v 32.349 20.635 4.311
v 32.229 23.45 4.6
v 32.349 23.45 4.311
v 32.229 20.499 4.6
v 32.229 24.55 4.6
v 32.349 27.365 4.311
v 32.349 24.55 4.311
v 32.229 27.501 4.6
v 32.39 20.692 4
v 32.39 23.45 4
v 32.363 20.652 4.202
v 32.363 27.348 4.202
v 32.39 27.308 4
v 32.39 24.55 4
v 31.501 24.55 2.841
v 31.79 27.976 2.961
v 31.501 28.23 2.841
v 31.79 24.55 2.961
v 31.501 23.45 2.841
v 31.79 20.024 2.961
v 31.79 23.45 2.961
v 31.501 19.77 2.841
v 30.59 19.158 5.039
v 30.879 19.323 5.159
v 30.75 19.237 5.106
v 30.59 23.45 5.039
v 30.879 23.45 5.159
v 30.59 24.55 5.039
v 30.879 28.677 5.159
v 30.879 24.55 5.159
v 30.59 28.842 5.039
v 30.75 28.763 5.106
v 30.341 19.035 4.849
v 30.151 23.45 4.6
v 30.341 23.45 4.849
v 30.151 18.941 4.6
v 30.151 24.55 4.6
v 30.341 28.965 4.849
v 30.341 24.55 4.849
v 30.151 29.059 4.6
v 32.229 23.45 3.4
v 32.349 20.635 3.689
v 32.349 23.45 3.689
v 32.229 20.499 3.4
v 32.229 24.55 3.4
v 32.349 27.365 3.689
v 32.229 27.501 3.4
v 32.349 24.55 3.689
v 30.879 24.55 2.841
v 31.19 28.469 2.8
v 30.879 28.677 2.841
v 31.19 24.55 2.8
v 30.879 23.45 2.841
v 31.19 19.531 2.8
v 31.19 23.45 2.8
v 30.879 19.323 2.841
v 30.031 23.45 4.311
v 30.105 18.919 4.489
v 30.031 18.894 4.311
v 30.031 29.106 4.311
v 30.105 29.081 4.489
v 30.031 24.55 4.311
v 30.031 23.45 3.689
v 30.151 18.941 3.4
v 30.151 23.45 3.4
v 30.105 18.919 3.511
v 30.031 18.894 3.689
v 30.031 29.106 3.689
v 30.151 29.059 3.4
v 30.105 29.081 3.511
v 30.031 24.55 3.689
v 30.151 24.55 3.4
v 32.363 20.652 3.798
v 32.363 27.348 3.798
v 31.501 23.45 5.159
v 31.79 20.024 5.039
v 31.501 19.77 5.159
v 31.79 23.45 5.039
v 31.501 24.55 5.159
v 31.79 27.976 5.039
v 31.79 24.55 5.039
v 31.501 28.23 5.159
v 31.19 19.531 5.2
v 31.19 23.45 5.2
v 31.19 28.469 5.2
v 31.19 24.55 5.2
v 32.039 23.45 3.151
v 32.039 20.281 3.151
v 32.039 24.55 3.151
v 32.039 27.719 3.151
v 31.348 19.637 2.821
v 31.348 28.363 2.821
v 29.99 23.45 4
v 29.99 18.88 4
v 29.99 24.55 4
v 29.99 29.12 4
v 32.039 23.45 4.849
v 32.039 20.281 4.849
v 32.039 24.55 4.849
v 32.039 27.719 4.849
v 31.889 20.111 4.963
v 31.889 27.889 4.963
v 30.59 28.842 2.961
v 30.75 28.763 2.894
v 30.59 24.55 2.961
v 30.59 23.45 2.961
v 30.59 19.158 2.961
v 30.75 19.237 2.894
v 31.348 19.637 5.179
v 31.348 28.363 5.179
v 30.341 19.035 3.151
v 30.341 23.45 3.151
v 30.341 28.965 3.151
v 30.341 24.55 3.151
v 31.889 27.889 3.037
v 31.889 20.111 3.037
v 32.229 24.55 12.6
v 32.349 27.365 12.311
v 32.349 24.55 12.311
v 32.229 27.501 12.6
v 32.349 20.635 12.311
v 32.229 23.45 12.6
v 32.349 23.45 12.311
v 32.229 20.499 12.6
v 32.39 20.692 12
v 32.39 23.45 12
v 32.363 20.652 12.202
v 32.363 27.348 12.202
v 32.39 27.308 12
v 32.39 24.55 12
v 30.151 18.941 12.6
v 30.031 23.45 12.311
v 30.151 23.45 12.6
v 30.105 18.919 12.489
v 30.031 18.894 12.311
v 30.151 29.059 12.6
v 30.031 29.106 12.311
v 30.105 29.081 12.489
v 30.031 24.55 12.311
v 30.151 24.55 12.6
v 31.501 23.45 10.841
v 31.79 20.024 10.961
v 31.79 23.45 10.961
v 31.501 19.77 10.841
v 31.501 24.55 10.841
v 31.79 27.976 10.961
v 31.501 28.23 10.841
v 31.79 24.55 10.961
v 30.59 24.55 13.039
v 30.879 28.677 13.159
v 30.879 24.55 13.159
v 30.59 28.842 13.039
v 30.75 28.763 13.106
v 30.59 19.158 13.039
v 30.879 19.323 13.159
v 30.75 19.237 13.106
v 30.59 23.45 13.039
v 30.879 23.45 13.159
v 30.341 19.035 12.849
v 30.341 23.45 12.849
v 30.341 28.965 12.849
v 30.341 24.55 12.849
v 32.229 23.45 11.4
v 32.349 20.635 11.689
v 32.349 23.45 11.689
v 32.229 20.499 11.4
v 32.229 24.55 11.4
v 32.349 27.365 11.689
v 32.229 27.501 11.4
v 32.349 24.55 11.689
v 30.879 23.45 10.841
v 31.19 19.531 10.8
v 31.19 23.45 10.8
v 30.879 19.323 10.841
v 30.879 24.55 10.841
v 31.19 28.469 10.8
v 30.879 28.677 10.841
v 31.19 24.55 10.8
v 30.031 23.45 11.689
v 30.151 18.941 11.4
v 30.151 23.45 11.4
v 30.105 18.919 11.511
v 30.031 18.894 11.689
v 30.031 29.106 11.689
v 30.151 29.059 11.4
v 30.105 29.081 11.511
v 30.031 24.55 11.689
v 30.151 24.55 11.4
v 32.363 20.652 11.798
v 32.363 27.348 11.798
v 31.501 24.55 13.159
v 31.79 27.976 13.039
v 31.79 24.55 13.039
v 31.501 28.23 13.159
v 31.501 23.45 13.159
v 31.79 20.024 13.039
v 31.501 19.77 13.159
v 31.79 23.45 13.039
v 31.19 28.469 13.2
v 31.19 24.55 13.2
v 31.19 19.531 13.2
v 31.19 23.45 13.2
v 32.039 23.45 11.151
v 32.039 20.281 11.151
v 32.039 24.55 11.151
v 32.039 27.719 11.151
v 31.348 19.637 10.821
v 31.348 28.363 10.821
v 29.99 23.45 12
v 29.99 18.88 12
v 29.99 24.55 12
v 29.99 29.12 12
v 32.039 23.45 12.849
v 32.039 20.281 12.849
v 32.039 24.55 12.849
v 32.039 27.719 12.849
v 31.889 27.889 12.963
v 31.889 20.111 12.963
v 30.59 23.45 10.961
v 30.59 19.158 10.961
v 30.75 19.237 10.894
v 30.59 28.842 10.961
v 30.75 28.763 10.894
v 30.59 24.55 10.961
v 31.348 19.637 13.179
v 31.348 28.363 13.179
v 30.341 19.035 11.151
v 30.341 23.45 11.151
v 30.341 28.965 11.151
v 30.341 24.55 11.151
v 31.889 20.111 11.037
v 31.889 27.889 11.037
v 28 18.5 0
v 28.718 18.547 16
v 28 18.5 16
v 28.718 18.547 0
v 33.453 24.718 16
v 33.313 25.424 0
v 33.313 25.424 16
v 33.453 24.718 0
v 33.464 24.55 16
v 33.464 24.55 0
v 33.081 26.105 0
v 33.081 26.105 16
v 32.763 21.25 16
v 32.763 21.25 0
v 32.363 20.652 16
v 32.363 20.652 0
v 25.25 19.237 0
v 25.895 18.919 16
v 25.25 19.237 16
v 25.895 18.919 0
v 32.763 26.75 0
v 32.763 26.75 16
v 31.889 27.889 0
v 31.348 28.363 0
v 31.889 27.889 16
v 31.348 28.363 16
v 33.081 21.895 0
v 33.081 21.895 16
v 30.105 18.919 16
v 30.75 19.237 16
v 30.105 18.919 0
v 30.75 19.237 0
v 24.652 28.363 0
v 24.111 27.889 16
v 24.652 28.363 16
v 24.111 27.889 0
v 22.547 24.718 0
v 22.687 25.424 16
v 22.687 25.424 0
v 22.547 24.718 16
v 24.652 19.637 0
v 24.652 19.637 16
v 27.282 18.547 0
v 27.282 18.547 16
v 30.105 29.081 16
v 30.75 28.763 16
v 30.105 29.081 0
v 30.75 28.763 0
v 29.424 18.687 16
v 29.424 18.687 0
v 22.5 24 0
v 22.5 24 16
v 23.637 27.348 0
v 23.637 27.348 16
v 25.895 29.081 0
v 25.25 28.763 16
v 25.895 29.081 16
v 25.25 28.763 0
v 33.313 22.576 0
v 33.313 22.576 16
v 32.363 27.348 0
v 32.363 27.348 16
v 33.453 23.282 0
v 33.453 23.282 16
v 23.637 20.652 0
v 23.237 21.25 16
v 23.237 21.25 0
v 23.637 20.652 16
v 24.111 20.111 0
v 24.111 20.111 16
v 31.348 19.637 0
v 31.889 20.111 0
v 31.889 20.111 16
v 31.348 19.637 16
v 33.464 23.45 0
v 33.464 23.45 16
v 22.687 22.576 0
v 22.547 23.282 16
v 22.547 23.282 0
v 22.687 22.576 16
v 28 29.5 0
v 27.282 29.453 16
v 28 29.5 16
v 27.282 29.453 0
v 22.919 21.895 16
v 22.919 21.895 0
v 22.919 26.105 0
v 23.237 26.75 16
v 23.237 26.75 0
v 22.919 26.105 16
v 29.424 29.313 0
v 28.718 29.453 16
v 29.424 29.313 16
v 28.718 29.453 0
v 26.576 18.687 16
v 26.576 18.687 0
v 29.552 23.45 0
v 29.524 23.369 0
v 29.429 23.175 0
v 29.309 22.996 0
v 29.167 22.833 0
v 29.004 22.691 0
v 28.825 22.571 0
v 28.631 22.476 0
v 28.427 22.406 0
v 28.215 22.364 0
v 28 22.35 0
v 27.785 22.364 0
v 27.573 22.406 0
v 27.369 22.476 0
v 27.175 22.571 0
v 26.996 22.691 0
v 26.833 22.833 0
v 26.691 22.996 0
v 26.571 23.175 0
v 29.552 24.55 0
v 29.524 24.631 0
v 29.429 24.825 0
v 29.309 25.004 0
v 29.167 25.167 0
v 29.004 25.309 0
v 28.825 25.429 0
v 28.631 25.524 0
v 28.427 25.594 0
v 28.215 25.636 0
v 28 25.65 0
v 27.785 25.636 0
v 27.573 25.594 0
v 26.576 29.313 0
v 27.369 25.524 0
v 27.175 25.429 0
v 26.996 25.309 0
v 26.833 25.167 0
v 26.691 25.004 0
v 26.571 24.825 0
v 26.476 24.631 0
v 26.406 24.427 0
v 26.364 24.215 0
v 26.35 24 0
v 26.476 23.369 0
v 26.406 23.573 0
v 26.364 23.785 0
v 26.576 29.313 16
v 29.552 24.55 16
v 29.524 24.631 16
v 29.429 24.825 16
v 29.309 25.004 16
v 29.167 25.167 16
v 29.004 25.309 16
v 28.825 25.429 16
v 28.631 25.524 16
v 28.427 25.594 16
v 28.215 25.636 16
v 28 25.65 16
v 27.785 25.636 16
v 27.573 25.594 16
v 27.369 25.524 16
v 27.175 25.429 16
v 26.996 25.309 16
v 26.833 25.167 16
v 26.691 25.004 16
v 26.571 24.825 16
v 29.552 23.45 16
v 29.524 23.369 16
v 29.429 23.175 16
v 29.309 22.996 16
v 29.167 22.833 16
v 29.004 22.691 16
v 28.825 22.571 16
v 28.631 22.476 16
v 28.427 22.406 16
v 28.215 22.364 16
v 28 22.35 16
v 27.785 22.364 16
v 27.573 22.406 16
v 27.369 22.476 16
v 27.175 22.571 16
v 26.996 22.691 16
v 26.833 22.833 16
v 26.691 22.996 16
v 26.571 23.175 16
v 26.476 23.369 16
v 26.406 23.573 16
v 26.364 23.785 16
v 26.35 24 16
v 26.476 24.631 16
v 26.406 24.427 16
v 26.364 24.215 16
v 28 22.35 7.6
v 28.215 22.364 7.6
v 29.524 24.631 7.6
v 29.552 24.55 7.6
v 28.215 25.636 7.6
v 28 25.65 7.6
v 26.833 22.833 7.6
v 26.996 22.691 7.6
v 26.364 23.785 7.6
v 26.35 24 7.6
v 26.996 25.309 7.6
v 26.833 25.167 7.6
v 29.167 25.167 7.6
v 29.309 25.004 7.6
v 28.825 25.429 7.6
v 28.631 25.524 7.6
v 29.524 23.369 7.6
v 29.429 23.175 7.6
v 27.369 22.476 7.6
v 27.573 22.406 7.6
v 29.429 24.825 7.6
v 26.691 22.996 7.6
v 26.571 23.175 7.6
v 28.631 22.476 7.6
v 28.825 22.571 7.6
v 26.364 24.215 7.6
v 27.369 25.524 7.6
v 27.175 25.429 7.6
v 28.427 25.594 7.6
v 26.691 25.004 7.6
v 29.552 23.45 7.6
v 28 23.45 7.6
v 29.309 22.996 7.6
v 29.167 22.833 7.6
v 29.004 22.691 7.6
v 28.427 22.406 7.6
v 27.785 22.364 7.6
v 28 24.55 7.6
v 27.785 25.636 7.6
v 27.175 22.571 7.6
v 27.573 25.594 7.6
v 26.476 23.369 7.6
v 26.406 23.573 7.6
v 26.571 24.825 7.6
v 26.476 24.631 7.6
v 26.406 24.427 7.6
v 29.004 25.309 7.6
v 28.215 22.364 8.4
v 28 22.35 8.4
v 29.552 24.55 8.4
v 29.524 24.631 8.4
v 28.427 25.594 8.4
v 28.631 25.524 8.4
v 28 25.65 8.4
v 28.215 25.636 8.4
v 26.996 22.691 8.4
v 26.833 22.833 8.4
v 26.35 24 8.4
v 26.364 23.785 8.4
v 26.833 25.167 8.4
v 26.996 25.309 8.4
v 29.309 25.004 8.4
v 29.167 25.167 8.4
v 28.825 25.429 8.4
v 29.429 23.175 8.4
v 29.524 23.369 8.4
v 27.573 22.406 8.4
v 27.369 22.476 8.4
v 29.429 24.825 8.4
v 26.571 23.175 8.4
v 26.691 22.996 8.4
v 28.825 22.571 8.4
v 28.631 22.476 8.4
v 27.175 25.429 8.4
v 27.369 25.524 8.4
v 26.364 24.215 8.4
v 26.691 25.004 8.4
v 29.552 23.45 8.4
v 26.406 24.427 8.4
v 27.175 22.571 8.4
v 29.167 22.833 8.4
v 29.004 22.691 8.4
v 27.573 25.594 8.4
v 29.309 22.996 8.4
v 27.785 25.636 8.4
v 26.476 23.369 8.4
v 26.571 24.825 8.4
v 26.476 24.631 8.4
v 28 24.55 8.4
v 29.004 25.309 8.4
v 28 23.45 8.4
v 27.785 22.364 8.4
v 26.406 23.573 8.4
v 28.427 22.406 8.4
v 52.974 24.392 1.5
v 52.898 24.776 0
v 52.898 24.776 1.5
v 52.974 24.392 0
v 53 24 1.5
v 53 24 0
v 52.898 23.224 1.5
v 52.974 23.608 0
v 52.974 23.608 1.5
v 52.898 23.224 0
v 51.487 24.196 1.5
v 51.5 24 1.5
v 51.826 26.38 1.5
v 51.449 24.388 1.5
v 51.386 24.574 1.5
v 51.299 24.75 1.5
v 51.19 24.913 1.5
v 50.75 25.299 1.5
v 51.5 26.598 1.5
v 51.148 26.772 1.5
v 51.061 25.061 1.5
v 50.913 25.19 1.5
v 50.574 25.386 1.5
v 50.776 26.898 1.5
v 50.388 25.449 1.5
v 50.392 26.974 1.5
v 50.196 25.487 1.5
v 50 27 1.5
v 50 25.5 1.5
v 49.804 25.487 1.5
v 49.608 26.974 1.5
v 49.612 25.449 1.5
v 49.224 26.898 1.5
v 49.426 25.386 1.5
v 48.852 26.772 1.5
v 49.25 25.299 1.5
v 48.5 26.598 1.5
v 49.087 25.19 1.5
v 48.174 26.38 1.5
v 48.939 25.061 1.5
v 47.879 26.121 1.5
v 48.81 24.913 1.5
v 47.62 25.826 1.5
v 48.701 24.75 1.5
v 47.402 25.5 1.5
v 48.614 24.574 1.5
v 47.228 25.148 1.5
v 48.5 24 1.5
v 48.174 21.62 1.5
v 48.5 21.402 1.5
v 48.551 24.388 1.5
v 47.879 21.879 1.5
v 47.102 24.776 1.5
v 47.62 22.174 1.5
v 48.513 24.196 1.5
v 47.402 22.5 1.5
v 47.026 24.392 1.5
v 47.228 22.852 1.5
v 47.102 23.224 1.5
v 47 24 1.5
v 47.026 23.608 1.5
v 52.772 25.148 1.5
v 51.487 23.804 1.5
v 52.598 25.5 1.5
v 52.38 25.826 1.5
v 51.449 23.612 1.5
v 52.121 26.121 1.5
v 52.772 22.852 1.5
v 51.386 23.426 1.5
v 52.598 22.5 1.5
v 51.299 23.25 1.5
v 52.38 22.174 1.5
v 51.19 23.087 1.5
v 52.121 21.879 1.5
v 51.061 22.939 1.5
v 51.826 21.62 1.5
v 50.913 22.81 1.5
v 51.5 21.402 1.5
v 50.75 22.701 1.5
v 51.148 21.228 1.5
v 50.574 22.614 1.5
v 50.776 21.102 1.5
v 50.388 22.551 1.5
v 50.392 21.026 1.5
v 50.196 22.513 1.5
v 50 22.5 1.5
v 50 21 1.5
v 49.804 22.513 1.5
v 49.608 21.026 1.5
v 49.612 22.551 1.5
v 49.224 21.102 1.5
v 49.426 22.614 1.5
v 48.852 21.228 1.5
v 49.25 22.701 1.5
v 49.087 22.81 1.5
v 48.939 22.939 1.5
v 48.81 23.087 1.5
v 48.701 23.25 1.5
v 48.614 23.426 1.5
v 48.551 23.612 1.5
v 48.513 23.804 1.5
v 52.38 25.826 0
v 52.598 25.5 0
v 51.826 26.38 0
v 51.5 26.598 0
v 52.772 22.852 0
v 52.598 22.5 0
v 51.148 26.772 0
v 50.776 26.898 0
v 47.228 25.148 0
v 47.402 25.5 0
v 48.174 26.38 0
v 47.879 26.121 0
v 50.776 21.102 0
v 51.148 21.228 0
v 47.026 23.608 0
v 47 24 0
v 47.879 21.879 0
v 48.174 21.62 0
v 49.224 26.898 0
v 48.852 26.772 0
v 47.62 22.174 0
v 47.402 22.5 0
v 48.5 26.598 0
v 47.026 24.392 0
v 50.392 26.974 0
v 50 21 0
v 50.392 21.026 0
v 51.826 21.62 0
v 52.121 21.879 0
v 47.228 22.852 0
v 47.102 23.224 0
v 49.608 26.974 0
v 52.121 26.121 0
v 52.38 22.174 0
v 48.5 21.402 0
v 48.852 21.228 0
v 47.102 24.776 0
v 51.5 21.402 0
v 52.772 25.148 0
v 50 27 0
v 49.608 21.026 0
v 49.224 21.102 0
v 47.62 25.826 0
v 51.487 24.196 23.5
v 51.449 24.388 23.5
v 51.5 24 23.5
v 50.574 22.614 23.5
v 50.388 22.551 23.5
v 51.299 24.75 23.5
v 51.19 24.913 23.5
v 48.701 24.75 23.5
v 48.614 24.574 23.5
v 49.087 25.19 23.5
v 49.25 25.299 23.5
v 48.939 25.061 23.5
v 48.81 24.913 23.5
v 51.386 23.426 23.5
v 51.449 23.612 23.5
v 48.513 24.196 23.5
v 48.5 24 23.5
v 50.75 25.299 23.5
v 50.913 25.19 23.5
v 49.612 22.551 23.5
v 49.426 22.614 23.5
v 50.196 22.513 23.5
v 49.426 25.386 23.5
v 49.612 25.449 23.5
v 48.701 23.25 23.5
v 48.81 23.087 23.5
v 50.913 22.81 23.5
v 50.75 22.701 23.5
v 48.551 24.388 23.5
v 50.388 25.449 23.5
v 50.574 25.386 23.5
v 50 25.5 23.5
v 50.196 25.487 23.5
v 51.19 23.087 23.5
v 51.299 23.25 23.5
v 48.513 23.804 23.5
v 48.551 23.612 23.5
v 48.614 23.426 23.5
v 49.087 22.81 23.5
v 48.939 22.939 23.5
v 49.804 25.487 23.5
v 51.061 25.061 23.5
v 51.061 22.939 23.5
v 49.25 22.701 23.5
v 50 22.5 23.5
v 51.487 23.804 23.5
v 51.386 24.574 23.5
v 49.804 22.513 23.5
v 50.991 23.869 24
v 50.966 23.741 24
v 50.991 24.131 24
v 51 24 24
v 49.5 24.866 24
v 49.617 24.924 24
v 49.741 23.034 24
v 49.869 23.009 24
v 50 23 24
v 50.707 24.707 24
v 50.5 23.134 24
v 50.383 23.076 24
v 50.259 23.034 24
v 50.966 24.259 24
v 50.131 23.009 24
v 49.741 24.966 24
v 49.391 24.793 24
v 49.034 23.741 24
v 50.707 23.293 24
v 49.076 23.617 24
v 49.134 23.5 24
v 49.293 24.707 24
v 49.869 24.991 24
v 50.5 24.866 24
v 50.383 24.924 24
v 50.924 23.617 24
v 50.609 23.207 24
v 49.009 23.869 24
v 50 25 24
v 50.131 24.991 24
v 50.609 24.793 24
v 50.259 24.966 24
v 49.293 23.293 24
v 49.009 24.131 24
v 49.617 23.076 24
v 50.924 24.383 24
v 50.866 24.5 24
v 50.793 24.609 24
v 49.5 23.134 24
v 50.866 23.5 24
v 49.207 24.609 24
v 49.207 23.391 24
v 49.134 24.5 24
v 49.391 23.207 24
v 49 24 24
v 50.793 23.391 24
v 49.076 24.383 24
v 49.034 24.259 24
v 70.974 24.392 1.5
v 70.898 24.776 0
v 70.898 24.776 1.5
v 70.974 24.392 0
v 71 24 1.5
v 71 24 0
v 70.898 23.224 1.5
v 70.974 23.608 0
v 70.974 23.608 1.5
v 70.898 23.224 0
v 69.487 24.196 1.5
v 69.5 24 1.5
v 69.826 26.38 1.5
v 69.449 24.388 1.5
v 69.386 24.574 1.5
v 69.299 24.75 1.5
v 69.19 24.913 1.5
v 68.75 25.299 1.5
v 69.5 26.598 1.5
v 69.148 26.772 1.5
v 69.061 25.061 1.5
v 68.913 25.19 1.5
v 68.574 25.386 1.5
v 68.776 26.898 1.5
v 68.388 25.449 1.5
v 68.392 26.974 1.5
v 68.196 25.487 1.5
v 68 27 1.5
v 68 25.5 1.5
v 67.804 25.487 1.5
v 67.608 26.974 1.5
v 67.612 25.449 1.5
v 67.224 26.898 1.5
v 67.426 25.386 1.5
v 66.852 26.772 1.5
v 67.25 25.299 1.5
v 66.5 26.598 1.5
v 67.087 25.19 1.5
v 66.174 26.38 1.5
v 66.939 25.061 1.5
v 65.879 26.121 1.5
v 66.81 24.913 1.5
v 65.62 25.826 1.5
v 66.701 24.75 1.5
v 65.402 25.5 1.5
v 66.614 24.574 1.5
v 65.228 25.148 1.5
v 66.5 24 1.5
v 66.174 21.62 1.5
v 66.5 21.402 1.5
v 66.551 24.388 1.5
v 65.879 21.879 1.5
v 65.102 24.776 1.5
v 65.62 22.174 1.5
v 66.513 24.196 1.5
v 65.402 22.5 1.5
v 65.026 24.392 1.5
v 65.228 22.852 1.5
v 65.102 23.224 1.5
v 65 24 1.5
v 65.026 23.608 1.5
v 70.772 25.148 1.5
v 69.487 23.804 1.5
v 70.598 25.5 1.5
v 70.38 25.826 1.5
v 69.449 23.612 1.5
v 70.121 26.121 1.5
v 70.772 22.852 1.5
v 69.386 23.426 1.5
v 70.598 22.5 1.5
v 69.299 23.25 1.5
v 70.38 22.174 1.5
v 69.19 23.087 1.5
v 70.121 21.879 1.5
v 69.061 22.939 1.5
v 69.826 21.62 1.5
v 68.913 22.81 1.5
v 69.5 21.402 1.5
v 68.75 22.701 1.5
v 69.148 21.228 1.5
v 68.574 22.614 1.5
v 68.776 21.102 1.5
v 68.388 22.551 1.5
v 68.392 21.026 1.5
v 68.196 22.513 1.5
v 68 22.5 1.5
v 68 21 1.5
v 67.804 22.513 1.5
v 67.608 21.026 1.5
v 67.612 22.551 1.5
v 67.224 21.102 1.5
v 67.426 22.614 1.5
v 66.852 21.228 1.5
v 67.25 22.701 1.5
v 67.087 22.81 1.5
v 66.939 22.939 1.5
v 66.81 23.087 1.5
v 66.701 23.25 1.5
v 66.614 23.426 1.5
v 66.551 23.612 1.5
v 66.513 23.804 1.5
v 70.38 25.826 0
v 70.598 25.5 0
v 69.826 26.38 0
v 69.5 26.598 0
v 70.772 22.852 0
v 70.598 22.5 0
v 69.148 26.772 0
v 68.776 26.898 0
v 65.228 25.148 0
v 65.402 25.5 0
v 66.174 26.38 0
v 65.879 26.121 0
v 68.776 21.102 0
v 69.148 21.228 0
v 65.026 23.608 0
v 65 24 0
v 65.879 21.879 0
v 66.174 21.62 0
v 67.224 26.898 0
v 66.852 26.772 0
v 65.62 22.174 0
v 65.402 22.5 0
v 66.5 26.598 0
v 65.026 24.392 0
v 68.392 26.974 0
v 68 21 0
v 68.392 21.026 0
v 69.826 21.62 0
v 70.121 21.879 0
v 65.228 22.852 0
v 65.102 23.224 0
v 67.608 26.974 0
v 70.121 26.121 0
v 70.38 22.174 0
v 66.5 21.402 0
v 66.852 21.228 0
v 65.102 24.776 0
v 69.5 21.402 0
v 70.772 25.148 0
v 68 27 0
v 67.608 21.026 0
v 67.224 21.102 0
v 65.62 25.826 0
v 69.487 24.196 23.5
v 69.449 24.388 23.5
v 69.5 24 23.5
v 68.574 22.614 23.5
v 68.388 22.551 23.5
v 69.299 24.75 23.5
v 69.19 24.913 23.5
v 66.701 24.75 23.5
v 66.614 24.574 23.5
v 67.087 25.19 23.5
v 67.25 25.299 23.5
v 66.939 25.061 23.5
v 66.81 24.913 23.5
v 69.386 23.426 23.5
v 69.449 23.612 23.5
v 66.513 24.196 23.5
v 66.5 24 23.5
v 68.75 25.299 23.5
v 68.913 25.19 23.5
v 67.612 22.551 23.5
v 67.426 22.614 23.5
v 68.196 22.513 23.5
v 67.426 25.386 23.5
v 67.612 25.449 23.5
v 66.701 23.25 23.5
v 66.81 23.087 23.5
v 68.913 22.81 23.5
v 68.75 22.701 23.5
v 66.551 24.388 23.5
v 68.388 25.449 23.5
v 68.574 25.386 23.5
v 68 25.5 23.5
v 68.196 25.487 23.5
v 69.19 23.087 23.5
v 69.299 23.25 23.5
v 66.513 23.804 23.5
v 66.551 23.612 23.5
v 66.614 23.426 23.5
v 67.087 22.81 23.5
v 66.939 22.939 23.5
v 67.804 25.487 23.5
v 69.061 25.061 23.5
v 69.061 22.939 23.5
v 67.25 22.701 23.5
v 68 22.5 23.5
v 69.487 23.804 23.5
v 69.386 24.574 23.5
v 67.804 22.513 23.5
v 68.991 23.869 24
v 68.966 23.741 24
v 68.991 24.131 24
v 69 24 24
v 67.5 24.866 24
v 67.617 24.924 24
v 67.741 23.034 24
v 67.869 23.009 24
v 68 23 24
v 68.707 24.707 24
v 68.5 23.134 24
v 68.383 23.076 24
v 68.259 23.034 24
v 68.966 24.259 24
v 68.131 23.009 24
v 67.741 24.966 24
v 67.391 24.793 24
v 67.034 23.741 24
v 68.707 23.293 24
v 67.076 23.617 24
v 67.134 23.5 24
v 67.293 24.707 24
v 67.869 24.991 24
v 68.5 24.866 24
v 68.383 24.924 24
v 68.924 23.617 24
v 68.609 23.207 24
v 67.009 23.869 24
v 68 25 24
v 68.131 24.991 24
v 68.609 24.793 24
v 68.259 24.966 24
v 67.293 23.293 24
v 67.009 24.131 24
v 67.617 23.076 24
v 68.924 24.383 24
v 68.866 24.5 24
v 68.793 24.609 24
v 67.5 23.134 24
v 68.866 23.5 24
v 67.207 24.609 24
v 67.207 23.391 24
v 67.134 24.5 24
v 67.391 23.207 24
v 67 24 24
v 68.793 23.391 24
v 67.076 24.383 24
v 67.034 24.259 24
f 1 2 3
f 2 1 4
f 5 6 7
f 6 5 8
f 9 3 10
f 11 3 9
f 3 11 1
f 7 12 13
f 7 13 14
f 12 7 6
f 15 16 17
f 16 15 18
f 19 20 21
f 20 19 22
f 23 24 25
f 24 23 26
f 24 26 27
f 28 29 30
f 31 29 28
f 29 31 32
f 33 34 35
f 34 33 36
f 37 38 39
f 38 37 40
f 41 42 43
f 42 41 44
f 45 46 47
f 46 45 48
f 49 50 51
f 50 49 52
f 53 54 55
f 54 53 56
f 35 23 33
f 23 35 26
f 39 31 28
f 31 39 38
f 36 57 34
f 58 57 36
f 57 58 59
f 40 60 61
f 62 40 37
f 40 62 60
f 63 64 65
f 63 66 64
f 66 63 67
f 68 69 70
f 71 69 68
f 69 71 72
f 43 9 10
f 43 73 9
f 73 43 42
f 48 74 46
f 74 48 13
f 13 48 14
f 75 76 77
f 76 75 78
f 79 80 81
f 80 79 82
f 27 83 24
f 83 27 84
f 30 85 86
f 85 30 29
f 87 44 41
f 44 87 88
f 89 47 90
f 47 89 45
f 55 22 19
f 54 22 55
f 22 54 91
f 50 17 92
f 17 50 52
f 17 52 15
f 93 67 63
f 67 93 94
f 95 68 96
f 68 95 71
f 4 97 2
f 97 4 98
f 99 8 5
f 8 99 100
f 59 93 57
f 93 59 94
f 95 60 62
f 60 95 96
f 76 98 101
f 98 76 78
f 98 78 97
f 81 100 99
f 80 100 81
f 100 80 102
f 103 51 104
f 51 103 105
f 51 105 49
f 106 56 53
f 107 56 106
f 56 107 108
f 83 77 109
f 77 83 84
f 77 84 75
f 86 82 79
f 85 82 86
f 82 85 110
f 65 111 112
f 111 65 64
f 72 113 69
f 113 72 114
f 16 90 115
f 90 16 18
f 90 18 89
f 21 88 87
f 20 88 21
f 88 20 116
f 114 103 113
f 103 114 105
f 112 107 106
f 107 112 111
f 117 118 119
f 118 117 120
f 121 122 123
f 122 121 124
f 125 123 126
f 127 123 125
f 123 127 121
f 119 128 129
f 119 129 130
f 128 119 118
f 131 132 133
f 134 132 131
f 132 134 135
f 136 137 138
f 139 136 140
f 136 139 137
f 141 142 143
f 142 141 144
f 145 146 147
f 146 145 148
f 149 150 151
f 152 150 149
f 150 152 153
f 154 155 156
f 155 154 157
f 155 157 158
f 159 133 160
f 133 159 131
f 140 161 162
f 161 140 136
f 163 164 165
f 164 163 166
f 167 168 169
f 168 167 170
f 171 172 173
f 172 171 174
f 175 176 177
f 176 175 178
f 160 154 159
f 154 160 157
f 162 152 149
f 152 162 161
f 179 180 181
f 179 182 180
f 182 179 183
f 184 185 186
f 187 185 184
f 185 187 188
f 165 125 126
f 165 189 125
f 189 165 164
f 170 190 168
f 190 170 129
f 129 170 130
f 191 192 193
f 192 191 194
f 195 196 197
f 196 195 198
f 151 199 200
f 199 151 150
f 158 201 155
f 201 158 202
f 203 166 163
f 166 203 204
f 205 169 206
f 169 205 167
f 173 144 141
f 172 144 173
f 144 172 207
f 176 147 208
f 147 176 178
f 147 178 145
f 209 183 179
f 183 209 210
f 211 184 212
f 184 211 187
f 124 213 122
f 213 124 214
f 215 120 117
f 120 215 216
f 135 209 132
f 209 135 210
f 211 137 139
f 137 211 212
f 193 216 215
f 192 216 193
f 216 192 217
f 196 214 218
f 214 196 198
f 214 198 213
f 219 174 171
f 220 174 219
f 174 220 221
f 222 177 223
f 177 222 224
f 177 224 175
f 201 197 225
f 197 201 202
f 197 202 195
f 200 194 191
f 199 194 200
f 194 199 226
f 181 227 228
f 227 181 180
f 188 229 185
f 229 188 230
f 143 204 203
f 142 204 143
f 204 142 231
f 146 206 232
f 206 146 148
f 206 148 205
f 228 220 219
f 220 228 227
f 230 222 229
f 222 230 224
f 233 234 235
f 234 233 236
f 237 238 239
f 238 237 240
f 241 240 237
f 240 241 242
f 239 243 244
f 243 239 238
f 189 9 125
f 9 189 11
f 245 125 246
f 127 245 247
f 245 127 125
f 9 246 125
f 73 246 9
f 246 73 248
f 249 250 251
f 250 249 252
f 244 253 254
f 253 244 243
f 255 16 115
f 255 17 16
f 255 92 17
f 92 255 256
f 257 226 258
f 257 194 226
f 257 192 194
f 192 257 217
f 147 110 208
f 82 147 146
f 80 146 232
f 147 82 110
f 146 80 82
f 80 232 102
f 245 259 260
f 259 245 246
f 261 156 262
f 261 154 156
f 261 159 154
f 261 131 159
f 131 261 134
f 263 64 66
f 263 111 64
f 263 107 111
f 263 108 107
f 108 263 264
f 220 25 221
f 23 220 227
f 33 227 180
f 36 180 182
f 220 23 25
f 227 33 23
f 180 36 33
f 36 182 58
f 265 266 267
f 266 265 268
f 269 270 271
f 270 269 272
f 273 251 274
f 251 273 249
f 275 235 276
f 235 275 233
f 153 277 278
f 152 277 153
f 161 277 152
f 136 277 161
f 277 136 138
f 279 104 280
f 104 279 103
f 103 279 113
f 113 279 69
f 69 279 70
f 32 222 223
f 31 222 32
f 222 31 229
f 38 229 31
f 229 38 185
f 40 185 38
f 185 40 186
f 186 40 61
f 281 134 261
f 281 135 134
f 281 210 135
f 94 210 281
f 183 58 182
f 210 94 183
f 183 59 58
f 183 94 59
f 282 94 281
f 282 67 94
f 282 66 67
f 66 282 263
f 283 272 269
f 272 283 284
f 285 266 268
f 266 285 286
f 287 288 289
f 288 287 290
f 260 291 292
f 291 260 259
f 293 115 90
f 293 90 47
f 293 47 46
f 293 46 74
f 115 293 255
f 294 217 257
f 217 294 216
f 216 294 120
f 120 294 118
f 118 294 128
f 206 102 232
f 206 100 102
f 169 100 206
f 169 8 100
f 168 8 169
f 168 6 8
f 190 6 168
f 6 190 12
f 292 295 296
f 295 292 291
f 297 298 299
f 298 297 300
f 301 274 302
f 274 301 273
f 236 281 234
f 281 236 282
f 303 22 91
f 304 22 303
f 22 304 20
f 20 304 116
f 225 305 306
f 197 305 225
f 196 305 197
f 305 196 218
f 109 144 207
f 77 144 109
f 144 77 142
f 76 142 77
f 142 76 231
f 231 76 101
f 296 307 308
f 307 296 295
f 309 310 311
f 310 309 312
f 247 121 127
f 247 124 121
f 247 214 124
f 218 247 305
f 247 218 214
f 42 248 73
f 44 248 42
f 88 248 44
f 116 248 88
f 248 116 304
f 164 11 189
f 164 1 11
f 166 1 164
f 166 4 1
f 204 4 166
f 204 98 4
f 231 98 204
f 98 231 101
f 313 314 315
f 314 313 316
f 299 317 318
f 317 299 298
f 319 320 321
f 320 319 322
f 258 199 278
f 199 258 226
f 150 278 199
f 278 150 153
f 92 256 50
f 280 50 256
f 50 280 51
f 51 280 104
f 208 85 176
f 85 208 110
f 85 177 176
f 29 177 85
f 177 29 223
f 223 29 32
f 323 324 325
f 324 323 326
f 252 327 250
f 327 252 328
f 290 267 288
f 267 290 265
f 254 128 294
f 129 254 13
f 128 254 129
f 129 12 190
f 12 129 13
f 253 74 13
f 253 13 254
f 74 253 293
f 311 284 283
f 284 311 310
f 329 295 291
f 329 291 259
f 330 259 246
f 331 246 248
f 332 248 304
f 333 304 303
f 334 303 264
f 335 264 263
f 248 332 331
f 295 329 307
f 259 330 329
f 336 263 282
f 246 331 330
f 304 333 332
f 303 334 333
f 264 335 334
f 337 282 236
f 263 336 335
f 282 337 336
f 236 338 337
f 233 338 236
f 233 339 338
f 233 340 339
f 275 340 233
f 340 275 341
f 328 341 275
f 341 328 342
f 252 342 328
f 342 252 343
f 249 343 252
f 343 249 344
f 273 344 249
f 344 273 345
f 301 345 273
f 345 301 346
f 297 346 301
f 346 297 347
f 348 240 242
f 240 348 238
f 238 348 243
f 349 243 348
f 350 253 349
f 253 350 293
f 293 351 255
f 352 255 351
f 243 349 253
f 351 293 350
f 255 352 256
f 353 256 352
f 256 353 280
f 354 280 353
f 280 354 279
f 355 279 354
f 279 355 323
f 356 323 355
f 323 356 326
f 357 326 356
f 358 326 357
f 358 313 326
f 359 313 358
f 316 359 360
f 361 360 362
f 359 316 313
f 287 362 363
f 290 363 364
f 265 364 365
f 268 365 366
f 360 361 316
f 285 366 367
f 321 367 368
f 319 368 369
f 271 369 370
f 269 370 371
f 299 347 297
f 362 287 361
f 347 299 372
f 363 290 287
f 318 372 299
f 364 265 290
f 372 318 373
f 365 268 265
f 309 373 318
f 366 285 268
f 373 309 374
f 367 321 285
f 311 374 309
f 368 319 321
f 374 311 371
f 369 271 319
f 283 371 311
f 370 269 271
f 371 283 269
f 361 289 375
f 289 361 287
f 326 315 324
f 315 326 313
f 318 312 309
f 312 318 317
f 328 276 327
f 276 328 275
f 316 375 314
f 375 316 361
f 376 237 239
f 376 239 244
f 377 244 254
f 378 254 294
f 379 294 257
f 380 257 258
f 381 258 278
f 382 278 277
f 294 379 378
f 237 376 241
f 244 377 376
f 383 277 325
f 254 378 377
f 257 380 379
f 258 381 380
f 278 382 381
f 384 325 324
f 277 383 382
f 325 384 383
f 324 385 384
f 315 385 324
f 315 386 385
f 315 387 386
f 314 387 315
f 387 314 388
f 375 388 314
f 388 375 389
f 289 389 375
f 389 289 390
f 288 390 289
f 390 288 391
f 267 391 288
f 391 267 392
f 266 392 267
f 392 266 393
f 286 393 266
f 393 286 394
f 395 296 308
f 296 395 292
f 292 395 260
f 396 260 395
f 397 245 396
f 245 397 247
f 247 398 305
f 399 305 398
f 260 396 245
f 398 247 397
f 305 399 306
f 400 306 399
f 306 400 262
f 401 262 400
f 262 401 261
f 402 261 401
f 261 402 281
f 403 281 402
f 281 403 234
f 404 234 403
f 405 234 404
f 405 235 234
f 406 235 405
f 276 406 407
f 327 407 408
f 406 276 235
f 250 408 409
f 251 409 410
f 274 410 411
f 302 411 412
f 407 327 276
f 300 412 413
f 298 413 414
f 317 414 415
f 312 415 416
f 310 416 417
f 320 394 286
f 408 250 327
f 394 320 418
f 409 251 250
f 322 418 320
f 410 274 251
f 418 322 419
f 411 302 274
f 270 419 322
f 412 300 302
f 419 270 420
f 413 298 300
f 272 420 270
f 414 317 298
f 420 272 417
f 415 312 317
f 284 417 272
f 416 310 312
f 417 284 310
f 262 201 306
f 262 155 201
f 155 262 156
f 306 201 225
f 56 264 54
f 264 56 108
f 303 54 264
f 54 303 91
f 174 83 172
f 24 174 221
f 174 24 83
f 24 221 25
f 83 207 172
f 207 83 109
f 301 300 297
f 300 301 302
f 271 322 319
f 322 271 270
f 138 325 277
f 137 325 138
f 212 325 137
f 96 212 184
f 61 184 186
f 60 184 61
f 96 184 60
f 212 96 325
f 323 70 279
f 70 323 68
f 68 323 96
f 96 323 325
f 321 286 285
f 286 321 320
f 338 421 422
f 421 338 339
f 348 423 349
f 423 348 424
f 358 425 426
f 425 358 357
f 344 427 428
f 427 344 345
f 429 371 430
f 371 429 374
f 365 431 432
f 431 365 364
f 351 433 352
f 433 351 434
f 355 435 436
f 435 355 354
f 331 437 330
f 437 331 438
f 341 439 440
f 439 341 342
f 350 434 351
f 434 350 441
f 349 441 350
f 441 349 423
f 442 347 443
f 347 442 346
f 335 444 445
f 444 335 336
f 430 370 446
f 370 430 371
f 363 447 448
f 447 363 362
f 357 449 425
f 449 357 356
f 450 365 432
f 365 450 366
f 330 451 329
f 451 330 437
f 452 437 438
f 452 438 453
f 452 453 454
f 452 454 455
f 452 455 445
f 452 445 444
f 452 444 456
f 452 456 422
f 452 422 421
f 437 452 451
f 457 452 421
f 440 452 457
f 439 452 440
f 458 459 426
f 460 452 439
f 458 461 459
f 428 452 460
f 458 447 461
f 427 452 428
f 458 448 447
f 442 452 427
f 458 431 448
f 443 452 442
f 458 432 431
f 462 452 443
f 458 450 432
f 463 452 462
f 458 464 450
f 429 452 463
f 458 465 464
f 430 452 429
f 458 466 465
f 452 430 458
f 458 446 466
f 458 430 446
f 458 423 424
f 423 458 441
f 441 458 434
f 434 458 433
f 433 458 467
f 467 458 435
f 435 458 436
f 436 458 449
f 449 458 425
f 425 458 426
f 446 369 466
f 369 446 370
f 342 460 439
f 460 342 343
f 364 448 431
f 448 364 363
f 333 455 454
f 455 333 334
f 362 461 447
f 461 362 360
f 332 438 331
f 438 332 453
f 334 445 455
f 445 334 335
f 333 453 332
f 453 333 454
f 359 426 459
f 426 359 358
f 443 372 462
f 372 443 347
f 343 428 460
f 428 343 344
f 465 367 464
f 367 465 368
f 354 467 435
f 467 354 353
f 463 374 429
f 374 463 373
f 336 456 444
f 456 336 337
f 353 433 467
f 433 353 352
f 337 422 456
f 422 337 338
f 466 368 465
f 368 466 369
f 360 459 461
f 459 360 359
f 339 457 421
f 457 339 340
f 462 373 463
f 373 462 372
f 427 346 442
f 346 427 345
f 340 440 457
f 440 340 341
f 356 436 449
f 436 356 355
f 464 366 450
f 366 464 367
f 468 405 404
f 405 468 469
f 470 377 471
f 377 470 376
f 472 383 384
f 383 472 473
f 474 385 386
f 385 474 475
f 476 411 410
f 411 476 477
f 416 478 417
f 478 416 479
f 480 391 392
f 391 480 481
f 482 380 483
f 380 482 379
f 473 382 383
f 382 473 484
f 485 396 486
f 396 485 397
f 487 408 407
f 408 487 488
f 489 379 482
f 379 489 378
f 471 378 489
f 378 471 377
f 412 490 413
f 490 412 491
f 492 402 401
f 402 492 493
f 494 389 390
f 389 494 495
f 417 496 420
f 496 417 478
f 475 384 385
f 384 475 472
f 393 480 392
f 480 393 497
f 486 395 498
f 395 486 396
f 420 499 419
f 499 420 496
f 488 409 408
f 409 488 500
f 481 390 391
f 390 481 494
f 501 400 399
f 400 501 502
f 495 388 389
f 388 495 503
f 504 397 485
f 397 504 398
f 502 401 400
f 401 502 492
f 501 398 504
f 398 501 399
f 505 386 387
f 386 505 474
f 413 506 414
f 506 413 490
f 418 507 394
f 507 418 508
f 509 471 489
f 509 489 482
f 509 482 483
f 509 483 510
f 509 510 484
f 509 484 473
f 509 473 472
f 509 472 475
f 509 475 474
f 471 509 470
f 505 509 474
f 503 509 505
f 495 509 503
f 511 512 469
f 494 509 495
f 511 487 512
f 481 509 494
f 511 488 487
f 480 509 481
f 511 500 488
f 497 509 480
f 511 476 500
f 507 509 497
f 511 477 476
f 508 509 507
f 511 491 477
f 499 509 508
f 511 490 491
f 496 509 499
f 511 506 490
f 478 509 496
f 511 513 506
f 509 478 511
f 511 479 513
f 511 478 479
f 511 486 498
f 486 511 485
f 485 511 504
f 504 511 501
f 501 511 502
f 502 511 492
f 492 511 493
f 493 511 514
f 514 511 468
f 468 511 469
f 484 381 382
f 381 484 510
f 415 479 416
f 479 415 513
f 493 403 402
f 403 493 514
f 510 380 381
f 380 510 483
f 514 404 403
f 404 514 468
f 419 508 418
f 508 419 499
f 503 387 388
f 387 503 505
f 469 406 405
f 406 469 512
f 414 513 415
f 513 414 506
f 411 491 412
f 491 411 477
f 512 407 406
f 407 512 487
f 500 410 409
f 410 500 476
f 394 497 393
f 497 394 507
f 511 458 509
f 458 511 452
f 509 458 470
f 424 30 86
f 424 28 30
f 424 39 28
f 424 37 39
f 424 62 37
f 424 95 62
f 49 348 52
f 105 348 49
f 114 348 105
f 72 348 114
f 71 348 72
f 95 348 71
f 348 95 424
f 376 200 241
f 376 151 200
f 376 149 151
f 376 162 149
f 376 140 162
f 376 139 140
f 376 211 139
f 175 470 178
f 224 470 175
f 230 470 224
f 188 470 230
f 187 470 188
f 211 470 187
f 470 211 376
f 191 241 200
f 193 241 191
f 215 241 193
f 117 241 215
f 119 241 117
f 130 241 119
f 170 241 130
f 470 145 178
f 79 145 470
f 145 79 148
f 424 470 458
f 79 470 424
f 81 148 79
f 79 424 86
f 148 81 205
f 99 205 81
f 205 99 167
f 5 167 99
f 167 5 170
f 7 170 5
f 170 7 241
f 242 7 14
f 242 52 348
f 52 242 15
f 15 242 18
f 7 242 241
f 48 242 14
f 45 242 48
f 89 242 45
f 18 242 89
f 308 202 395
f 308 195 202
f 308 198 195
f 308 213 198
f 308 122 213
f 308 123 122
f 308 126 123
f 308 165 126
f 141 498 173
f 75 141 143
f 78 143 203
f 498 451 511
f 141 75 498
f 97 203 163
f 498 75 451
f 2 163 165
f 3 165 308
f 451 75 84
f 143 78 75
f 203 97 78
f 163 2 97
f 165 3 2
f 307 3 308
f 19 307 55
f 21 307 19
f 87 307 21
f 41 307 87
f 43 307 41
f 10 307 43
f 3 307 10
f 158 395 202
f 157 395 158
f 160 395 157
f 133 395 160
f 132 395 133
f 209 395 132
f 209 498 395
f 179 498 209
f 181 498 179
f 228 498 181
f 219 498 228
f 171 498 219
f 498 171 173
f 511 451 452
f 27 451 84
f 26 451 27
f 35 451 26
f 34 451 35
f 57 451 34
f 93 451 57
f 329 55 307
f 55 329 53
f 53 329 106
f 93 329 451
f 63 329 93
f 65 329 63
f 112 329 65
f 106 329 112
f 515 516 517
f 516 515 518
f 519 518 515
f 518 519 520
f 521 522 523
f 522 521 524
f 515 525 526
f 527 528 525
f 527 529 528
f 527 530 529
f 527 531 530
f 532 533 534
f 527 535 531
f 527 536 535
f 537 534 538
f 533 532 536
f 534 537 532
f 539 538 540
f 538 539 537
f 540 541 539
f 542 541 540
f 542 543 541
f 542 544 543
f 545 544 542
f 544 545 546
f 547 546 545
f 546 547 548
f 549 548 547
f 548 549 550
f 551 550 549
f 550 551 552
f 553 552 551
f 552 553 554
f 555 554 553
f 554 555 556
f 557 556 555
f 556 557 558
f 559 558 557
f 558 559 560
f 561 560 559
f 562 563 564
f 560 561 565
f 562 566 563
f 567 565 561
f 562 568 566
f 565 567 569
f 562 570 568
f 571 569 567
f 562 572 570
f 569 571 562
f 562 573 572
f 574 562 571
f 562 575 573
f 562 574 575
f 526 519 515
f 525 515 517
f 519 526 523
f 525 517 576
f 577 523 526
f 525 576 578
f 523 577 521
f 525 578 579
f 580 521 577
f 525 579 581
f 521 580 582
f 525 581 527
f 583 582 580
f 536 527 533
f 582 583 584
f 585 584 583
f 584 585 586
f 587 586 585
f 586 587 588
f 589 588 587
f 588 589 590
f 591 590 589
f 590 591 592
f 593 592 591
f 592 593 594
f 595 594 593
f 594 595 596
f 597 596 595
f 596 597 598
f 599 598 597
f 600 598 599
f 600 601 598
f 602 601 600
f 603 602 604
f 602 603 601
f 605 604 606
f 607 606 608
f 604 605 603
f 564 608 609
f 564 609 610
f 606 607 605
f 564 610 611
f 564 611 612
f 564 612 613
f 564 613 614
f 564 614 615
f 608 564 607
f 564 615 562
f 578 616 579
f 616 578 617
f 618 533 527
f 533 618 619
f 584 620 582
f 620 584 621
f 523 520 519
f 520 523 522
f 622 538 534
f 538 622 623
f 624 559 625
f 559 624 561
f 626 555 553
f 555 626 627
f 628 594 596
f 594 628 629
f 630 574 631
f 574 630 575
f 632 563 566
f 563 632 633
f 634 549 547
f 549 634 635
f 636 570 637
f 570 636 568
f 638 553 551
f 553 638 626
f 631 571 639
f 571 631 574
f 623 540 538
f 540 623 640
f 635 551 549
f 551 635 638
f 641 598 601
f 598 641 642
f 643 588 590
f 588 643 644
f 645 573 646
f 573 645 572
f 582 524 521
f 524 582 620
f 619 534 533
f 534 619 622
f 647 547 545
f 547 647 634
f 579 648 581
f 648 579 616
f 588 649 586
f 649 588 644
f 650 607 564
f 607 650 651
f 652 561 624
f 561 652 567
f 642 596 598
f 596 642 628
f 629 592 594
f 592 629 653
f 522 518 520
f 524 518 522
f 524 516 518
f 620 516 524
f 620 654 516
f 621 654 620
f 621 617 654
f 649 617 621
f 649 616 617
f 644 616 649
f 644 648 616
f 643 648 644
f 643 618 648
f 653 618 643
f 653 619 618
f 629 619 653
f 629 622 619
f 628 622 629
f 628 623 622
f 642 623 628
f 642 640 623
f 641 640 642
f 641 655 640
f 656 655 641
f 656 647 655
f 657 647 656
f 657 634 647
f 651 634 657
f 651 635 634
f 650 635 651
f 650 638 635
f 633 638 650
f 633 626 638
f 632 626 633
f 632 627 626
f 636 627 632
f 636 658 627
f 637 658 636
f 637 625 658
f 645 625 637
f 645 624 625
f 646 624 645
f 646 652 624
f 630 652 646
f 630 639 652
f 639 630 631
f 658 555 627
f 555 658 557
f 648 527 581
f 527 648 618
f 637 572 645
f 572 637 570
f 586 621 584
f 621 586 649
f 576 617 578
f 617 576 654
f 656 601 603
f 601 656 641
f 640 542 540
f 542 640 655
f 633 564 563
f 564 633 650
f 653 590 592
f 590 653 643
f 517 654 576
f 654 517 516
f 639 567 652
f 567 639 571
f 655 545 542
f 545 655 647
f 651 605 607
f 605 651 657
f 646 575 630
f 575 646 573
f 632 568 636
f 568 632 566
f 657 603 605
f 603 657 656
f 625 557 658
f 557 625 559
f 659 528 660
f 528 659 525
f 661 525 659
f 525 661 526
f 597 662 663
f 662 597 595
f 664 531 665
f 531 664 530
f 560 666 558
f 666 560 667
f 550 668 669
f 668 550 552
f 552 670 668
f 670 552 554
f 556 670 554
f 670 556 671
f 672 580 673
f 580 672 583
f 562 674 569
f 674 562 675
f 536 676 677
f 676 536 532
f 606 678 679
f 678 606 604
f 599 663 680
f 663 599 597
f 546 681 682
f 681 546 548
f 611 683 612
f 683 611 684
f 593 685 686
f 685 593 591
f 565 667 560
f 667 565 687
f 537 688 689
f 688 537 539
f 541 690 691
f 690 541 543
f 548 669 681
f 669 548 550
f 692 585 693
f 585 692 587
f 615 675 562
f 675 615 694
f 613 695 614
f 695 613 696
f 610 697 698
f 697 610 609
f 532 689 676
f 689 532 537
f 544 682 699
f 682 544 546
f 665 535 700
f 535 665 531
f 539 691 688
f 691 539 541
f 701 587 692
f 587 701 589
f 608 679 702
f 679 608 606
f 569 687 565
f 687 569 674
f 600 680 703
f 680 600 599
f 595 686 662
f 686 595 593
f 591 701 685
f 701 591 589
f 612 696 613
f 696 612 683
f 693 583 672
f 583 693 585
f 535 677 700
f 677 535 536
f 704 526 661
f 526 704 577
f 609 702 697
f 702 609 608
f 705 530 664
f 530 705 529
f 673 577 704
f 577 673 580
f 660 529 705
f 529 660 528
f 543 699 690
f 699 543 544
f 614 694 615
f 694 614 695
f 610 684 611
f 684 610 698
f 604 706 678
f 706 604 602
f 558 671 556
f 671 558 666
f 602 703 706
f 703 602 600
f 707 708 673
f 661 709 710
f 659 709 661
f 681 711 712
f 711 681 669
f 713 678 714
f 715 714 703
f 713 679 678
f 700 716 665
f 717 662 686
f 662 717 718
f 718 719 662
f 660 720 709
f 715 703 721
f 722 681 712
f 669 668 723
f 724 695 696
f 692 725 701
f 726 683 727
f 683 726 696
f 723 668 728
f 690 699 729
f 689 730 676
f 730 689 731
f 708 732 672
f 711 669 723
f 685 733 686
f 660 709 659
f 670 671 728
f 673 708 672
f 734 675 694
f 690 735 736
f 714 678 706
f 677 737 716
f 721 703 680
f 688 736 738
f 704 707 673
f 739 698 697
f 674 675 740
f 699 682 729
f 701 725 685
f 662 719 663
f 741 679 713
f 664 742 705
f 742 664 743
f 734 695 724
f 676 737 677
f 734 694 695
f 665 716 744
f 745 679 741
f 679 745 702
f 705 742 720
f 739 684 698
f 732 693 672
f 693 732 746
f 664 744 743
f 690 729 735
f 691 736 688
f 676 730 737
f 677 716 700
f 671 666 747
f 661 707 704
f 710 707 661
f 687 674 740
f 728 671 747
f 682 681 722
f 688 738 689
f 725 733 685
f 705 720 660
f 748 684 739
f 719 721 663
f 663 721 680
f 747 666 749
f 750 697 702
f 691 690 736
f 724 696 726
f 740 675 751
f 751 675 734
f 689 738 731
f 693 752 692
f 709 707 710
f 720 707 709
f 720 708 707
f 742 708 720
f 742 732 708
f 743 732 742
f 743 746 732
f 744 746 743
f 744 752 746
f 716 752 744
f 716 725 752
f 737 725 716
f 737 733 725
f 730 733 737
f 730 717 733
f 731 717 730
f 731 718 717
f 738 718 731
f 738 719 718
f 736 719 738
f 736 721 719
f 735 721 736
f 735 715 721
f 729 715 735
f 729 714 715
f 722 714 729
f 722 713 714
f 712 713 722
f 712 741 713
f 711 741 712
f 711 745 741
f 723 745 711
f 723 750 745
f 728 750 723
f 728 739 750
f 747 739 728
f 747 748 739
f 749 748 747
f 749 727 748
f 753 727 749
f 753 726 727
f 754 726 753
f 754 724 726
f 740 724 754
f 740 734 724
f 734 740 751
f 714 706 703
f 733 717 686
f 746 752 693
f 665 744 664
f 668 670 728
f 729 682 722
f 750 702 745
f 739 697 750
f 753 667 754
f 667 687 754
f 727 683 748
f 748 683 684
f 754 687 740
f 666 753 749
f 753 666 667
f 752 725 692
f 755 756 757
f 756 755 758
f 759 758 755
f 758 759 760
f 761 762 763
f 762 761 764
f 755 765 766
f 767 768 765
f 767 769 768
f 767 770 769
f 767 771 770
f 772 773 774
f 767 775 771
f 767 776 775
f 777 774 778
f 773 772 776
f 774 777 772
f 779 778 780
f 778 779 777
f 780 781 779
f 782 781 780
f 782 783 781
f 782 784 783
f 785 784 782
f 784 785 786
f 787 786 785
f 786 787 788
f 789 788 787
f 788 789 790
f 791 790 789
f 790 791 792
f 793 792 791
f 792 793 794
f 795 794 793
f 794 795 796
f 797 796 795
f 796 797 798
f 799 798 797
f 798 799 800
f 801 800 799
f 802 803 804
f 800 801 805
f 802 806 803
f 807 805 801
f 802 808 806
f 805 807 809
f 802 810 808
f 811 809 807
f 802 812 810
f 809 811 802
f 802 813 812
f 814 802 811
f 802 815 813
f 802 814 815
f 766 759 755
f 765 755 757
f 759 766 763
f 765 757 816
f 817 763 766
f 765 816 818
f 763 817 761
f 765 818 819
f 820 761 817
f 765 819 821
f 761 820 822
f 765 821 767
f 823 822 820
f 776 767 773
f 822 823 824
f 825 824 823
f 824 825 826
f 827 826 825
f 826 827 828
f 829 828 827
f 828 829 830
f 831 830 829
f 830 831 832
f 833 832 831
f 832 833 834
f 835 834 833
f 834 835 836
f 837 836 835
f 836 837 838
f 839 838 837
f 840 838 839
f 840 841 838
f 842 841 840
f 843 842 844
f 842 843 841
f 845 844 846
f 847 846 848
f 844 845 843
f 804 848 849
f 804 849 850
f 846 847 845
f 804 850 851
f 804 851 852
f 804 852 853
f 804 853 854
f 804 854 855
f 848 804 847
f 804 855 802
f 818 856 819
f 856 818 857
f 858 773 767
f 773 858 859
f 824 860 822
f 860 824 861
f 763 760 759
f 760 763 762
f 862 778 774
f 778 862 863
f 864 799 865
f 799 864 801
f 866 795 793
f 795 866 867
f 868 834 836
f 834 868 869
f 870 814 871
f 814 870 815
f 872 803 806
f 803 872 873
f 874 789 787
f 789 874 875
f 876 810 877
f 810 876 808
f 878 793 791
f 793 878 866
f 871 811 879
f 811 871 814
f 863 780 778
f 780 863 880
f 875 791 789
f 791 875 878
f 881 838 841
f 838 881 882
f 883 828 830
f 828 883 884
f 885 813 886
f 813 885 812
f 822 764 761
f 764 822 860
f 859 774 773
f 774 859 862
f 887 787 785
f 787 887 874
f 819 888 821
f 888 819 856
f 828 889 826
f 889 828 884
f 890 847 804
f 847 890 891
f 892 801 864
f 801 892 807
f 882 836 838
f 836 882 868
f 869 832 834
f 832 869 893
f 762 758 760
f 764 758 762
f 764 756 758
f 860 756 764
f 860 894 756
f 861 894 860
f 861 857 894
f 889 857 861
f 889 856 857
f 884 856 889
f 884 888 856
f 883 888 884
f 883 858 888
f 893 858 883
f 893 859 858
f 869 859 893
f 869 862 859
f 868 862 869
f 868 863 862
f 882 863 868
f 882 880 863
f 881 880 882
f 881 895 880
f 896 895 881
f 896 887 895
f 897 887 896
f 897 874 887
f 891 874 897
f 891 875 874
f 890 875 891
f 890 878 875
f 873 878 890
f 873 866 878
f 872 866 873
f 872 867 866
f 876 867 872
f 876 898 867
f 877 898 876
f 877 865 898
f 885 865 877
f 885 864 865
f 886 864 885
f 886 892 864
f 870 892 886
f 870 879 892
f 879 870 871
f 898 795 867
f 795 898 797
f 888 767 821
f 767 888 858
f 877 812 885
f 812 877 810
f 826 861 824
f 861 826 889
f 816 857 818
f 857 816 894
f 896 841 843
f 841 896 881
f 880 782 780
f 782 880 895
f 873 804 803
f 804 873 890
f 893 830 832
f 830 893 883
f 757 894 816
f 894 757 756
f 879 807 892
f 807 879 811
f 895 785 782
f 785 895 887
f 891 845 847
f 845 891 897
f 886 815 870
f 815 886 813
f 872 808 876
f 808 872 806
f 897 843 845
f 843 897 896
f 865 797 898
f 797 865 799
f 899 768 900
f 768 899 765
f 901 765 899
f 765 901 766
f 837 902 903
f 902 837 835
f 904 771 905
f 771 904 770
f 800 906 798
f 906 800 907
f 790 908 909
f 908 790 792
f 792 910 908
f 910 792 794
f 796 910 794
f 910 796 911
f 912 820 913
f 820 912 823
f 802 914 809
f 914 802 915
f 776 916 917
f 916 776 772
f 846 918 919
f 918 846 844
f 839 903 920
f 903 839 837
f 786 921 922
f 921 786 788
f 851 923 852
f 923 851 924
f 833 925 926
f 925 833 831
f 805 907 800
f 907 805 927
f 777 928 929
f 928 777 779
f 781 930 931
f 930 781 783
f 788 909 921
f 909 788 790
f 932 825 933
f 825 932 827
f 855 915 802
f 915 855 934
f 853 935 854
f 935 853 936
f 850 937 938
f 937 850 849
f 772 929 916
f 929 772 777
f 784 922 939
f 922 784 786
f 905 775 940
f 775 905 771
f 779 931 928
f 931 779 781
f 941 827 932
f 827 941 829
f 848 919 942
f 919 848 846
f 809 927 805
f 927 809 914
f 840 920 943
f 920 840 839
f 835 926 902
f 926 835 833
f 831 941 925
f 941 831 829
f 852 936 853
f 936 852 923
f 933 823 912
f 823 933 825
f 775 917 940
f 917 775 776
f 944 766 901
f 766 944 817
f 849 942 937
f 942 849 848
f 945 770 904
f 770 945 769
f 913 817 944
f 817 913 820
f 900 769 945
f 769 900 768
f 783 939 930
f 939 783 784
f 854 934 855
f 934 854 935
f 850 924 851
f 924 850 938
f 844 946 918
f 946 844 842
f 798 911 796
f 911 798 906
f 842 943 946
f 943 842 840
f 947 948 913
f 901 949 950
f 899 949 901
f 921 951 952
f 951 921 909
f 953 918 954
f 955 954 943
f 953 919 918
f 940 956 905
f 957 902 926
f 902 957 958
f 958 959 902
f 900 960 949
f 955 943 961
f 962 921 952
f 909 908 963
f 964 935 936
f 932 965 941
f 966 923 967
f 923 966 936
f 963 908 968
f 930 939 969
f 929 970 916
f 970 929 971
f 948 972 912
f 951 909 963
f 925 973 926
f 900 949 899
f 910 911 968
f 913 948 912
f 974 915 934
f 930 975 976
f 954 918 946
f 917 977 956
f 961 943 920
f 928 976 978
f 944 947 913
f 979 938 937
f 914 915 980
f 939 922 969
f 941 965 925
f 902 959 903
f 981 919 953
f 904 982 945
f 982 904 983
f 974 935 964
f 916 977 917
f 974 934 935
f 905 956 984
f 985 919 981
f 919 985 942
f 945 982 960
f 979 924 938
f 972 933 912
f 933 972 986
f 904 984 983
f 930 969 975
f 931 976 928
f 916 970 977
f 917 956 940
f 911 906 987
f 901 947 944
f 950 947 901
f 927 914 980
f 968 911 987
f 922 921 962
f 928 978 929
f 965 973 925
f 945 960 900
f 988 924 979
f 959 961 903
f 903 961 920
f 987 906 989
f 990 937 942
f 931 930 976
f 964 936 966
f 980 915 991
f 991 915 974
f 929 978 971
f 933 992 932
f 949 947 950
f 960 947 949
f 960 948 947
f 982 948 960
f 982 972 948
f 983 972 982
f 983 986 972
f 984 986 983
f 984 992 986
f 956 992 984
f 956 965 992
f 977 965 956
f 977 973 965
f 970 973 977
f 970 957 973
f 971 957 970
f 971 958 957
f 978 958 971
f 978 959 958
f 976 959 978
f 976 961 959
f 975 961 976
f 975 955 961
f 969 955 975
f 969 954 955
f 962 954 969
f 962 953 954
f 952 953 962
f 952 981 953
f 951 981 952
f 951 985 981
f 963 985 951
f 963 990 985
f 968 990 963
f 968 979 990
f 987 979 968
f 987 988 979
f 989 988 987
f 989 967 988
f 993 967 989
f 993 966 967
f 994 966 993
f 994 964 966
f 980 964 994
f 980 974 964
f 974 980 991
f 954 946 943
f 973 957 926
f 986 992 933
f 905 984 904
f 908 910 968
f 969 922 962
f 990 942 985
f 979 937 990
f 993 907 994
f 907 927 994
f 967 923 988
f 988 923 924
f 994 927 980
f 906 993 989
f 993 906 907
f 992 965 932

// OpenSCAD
/*
Sample 130: Kompakte asymmetrische Wellenkupplung — 3 auf 3 mm
Generated from the FDM Mechanical Sample Library.
Units: millimetres.

Override examples:
  openscad -o custom.stl -D 'view="plate"' -D 'render_fn=64' model.scad
  openscad -o preview.png -D 'view="assembly"' model.scad
*/
use <../../../library/fdm_mechanisms.scad>

render_fn = is_undef(render_fn) ? 48 : render_fn;
view = is_undef(view) ? "plate" : view;
$fn = render_fn;

sample_micro_shaft_coupler(
    view=view,
    input_d=3,
    output_d=3,
    input_clearance=0.15,
    output_clearance=0.15,
    length=16,
    outer_d=11,
    fastener=2.4,
    axial_stop=0.8
);
